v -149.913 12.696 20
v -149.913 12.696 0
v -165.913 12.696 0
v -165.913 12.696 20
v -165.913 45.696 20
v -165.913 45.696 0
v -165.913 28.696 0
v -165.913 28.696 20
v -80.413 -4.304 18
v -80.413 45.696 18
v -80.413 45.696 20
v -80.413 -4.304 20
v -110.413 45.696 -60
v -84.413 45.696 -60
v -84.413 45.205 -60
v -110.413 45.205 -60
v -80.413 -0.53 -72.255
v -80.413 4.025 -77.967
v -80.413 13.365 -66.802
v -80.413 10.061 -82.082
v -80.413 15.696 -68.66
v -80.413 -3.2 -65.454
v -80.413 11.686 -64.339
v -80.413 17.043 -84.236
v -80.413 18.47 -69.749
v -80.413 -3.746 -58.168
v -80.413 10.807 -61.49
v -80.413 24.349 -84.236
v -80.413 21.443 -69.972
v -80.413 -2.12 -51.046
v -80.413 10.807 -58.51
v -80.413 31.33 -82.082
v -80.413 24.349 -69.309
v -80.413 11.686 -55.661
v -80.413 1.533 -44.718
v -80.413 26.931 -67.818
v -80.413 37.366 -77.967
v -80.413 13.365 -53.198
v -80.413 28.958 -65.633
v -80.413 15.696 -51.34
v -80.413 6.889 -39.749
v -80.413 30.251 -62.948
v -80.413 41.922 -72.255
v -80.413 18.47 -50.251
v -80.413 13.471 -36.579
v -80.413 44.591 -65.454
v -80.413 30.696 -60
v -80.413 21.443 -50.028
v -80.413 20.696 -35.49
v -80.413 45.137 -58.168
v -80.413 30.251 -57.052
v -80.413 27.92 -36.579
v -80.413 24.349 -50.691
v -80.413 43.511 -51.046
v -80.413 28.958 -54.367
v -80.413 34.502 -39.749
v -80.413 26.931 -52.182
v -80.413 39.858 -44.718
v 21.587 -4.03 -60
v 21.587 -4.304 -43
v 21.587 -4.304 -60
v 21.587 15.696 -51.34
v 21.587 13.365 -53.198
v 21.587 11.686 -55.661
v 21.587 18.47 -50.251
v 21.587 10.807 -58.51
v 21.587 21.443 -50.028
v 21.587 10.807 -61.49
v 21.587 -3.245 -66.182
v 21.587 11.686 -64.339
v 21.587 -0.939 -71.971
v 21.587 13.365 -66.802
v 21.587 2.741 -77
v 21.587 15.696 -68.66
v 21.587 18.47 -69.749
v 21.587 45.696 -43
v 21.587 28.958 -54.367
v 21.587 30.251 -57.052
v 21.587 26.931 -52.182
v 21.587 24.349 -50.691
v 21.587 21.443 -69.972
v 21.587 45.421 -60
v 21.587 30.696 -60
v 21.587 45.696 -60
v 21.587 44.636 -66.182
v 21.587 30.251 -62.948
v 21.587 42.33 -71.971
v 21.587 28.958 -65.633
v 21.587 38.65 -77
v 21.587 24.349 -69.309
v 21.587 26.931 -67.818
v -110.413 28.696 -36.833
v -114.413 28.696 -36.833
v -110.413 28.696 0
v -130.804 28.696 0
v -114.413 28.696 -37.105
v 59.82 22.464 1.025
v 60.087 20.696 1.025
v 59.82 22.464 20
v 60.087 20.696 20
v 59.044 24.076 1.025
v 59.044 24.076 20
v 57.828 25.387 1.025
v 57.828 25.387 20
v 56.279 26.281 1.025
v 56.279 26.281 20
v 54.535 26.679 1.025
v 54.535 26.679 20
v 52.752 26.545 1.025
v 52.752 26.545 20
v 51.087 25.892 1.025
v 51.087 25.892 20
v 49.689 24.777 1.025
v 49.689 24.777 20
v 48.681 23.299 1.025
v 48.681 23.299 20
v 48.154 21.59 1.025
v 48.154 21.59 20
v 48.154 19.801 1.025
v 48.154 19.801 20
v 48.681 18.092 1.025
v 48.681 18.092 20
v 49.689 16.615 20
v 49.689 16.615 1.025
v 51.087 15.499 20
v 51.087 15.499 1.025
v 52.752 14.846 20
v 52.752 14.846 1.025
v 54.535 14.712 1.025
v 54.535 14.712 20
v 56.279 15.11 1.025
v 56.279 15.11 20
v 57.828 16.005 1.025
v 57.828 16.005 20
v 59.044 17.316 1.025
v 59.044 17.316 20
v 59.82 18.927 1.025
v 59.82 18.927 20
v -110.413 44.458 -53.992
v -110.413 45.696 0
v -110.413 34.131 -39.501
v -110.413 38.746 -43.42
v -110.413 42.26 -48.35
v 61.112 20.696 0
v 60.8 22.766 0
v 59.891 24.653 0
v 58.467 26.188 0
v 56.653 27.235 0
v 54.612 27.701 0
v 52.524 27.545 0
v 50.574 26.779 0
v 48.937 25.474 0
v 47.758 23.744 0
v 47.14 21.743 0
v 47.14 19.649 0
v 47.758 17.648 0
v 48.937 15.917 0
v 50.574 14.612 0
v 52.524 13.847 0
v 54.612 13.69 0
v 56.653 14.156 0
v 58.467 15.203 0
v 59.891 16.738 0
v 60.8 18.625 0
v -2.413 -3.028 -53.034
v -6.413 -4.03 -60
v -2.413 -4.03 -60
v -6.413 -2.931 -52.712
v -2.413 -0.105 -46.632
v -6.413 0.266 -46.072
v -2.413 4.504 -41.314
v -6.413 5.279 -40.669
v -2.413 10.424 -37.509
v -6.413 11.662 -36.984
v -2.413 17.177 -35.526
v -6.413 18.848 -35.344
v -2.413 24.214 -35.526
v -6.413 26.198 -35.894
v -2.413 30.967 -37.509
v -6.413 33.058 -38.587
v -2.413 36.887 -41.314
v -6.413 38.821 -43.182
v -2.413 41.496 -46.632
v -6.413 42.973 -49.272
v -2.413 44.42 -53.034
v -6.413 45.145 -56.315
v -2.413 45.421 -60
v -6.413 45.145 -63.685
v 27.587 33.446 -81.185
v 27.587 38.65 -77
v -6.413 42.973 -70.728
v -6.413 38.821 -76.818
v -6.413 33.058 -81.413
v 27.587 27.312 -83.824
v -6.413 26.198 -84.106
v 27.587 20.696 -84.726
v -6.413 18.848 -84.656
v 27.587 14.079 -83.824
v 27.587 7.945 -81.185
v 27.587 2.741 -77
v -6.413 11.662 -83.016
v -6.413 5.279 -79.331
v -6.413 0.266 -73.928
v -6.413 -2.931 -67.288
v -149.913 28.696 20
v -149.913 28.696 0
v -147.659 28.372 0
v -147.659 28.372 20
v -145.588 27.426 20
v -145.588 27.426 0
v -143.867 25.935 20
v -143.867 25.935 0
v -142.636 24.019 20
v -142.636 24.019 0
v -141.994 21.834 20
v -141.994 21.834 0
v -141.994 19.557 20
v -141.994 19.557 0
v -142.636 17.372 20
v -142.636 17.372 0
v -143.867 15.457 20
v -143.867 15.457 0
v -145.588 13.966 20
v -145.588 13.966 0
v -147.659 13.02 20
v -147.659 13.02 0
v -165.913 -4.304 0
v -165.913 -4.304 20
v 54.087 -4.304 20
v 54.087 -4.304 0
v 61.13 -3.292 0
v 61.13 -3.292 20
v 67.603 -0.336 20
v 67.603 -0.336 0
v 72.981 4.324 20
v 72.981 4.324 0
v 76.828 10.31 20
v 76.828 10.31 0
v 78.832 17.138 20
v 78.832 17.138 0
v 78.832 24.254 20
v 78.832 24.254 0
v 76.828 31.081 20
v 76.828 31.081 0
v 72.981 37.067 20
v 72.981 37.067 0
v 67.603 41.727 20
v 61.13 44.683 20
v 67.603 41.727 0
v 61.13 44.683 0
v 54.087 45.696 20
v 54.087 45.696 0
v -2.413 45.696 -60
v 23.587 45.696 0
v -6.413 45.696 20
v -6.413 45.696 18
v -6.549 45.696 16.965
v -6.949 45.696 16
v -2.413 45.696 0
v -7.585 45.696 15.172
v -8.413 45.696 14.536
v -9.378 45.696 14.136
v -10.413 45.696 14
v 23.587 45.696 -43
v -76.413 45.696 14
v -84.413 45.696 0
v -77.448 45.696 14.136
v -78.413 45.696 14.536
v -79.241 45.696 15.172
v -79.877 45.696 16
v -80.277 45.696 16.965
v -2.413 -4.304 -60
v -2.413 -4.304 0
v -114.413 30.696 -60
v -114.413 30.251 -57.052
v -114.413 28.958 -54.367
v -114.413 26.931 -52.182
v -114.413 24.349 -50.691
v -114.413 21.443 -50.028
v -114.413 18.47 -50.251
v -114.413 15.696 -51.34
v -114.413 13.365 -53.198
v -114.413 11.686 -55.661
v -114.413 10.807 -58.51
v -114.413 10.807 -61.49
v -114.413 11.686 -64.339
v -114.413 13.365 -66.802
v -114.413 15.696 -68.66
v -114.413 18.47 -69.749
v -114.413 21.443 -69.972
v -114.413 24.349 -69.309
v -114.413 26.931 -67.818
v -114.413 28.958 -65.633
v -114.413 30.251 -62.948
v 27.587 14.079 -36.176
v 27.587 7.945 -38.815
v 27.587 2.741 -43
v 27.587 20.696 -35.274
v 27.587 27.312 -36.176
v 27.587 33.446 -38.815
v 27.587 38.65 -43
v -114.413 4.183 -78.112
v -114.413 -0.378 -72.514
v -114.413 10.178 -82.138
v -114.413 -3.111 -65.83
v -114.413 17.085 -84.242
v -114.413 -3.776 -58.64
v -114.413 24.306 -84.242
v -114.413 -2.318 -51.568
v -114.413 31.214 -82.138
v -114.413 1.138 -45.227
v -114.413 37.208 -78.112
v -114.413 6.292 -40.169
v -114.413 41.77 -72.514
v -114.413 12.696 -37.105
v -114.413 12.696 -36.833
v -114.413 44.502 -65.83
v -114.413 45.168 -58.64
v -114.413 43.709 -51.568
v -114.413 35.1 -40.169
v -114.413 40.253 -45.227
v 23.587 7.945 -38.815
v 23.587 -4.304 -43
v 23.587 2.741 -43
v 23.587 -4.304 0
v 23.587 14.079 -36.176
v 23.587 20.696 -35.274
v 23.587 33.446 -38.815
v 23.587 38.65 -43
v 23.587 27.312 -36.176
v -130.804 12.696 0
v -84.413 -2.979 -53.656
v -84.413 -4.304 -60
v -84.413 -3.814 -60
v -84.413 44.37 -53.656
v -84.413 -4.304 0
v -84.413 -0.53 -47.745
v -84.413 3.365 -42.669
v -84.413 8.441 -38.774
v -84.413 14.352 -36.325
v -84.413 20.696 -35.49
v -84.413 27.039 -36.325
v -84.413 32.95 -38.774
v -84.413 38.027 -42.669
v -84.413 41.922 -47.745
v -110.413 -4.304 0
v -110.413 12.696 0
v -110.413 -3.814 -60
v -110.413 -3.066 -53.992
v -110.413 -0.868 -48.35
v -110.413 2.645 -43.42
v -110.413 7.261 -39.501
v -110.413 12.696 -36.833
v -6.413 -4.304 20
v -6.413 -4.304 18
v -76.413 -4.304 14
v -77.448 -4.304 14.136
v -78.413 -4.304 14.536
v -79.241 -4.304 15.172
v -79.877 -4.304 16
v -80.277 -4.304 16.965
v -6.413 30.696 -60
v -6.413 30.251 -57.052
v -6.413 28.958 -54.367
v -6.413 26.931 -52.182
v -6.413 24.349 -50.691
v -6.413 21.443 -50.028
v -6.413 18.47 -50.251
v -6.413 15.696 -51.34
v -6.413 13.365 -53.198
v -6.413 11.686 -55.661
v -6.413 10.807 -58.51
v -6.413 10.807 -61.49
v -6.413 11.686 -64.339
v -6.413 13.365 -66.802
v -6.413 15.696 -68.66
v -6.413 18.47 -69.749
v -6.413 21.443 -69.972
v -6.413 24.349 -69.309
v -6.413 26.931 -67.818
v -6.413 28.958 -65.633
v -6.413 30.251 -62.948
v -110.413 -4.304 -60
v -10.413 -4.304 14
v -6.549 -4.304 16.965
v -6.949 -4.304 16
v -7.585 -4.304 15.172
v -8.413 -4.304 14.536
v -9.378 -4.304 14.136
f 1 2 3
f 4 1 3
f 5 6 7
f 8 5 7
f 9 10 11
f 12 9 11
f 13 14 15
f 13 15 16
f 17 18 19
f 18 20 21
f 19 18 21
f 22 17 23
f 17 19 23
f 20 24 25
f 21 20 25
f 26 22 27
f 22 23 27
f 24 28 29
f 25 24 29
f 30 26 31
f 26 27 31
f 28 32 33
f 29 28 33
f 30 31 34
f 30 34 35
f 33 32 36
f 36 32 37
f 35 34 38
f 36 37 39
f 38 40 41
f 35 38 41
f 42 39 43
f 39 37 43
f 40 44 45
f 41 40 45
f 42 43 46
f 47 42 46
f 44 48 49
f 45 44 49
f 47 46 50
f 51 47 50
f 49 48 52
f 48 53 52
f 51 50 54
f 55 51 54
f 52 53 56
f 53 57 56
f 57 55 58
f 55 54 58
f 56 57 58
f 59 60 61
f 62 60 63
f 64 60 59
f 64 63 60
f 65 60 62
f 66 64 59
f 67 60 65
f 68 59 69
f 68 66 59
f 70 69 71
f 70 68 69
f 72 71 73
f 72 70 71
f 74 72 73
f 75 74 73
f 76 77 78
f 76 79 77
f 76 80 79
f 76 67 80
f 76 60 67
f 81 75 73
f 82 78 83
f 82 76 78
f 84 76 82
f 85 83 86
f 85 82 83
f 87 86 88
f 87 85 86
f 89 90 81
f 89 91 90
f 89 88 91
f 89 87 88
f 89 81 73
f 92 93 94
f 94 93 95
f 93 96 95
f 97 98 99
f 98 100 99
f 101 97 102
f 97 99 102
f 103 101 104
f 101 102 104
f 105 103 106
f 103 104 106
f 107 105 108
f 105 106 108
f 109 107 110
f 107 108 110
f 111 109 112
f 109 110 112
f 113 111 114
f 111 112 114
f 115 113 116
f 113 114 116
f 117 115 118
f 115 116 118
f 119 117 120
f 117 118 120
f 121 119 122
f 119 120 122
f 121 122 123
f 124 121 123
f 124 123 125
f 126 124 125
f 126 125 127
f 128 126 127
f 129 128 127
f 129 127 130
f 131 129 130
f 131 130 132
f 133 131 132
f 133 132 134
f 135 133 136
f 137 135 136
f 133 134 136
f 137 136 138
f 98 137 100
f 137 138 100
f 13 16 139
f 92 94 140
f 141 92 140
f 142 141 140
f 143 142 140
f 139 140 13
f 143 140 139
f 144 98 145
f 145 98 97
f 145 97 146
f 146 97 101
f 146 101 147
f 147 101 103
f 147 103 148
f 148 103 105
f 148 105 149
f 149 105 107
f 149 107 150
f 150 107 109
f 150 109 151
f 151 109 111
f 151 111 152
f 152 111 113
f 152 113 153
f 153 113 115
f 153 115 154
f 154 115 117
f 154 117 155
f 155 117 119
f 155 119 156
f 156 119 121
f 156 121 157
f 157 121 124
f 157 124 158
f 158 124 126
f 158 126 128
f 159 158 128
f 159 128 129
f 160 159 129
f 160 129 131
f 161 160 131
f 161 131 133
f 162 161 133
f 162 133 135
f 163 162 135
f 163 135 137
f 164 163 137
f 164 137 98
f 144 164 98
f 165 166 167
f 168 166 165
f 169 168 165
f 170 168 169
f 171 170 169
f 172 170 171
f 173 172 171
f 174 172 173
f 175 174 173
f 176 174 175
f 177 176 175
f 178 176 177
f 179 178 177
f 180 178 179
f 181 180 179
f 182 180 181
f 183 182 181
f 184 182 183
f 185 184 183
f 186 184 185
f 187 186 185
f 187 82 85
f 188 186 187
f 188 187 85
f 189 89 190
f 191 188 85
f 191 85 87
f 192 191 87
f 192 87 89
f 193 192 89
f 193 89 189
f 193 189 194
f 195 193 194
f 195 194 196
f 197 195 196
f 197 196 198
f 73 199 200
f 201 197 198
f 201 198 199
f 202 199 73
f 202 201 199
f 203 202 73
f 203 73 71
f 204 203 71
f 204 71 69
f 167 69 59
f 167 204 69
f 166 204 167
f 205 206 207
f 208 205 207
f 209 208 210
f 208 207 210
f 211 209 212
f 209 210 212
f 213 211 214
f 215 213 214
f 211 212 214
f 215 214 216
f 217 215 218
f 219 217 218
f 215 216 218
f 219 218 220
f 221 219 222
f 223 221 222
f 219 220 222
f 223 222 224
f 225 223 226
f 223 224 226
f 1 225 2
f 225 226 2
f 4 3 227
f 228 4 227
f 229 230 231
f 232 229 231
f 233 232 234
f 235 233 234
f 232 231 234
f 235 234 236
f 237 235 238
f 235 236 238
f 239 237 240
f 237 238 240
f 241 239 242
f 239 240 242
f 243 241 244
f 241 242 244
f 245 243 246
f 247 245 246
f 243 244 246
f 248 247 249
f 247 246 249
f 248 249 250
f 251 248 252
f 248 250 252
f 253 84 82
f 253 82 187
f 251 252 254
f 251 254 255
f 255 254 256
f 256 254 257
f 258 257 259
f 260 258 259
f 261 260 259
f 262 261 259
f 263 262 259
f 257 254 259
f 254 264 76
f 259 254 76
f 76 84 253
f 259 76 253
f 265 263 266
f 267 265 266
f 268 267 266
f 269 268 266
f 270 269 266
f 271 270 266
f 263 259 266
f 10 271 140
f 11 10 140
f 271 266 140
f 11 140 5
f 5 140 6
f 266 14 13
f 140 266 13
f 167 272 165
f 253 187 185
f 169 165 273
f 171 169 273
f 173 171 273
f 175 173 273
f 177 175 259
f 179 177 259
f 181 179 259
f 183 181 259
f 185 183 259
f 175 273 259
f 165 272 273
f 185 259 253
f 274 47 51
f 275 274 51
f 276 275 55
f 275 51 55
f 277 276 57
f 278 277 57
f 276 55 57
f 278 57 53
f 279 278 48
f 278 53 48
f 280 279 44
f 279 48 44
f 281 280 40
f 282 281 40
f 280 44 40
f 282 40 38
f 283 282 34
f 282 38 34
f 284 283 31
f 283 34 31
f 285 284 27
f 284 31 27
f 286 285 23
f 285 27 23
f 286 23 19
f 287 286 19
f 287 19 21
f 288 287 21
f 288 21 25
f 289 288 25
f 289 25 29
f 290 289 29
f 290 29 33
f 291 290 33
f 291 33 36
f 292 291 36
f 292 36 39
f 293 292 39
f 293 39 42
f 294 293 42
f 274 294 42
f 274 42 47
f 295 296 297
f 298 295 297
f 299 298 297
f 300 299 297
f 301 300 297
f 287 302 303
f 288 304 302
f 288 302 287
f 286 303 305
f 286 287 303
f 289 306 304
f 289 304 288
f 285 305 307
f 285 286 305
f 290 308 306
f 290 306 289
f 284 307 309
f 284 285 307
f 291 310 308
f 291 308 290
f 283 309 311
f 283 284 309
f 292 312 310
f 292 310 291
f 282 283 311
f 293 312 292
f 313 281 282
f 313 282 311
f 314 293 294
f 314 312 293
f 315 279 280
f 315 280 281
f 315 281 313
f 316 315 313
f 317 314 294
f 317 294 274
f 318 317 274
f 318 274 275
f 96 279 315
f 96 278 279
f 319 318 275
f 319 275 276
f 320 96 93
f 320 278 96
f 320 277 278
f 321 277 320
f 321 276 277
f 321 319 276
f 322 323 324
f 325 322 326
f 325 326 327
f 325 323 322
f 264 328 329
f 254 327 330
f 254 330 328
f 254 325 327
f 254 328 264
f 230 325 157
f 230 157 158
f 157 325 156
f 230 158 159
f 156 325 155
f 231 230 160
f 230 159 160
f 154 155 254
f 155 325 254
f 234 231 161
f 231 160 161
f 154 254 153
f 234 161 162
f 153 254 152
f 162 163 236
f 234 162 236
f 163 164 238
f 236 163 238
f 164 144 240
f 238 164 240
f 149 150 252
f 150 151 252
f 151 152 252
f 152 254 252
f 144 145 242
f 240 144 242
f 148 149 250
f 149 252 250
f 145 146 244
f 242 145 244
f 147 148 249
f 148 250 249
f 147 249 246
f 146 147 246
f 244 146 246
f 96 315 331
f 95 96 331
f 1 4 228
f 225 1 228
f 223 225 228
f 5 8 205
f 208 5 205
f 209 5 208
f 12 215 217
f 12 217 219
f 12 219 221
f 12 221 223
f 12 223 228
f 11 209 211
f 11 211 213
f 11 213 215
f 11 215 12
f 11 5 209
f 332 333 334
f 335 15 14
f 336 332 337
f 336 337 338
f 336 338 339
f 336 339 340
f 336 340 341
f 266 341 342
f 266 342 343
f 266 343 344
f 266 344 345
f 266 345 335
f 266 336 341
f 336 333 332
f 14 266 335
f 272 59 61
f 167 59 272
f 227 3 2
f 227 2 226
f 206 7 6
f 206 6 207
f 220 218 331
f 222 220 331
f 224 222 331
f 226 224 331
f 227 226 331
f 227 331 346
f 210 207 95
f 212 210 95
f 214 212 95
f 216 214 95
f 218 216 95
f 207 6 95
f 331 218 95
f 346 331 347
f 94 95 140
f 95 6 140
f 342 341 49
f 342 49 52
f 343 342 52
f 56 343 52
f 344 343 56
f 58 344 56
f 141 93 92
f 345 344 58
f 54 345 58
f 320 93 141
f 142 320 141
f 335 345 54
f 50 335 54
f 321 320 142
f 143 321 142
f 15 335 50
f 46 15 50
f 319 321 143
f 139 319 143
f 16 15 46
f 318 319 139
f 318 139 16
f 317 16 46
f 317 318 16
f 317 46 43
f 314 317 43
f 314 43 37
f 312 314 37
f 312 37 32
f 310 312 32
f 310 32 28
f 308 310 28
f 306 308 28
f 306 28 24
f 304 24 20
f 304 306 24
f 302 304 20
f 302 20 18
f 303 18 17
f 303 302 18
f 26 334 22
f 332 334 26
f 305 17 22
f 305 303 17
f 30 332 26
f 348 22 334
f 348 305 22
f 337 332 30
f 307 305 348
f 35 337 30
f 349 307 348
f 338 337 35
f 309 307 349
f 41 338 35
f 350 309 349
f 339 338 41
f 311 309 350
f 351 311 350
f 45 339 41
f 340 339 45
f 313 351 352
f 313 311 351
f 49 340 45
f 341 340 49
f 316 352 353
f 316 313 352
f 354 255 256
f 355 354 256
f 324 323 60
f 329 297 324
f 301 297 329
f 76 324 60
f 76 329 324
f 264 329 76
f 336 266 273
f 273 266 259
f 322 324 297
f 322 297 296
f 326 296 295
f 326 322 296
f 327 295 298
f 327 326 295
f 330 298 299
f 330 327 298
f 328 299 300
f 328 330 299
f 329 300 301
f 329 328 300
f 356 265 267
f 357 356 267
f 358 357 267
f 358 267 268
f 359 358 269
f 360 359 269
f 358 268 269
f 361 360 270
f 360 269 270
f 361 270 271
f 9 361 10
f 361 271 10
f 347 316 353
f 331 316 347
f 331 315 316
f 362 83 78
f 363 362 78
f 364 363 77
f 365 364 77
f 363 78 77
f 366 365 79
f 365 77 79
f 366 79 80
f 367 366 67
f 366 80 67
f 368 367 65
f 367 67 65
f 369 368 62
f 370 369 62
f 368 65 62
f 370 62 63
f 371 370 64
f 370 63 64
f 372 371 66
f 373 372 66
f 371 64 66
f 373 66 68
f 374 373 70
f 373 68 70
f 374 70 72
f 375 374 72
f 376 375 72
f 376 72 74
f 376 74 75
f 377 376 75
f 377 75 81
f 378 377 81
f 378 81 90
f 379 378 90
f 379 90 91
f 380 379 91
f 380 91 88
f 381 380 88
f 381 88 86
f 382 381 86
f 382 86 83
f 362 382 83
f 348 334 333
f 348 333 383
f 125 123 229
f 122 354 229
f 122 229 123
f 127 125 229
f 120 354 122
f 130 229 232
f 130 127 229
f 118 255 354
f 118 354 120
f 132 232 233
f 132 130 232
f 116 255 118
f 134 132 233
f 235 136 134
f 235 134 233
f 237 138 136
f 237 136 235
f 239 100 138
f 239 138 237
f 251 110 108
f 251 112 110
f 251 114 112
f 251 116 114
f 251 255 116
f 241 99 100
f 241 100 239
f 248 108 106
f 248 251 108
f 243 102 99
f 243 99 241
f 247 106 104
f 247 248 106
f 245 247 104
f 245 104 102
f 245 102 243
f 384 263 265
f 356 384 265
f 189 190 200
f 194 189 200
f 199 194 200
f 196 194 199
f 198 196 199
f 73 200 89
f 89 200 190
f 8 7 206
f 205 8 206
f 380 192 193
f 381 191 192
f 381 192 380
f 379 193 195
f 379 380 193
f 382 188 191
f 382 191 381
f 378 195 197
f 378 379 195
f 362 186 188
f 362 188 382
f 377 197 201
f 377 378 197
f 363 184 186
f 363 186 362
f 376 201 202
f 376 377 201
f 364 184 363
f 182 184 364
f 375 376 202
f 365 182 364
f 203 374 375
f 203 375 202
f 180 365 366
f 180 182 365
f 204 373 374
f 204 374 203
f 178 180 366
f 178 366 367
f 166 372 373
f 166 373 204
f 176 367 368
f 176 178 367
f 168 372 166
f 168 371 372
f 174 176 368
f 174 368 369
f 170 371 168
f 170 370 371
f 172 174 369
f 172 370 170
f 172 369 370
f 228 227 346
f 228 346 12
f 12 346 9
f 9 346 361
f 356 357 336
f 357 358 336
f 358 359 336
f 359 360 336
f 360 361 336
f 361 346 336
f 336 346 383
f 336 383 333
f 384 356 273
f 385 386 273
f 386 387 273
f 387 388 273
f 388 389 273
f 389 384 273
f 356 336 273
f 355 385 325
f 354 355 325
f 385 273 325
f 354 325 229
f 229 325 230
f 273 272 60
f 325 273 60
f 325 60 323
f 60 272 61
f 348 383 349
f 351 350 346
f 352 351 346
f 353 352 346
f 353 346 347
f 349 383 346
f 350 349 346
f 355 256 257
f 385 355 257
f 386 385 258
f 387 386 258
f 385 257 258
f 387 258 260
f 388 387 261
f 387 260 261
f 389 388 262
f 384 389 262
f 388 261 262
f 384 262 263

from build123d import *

# Parameters (mm, degrees)
BOSS_EXTRUDE1_DEPTH              = 20
CUT_EXTRUDE1_DEPTH               = 80
M14X2_0_TAPPED_HOLE2_D           = 12
M14X2_0_TAPPED_HOLE2_CSINK_D     = 14.05
M14X2_0_TAPPED_HOLE2_CSINK_ANGLE = 90
SKETCH11_W                       = 26
SKETCH11_H                       = 50
BOSS_EXTRUDE2_DEPTH              = 60
BOSS_EXTRUDE3_START              = 4
SKETCH12_R                       = 24.50968872
BOSS_EXTRUDE3_DEPTH              = 34
BOSS_EXTRUDE4_START              = 4
SKETCH13_R                       = 24.725624797
BOSS_EXTRUDE4_DEPTH              = 34
SKETCH14_R                       = 10
CUT_EXTRUDE2_DEPTH               = 234
SKETCH15_W                       = 34
SKETCH15_H                       = 100.230824912
CUT_EXTRUDE3_DEPTH               = 6
RIB6_REACH                       = 189.964
SKETCH16_WALL_W                  = 418.569099694
SKETCH16_WALL_H                  = 16


with BuildPart() as part:
    # Sketch1 → Boss-Extrude1 (new body)
    with BuildSketch(Plane.XY):
        with BuildLine():
            Line((-165.913043478, -4.304347826), (54.086956522, -4.304347826))
            ThreePointArc((54.086956522, -4.304347826), (79.086956522, 20.695652174), (54.086956522, 45.695652174))
            Line((54.086956522, 45.695652174), (-165.913043478, 45.695652174))
            Line((-165.913043478, 45.695652174), (-165.913043478, 28.695652174))
            Line((-165.913043478, 28.695652174), (-149.913043478, 28.695652174))
            ThreePointArc((-149.913043478, 28.695652174), (-141.913043478, 20.695652174), (-149.913043478, 12.695652174))
            Line((-149.913043478, 12.695652174), (-165.913043478, 12.695652174))
            Line((-165.913043478, 12.695652174), (-165.913043478, -4.304347826))
        make_face()
    extrude(amount=BOSS_EXTRUDE1_DEPTH)

    # Sketch2 → Cut-Extrude1 (cut)
    with BuildSketch(Plane(origin=(0, 45.695652174, 0), x_dir=(1, 0, 0), z_dir=(0, 1, 0))):
        with BuildLine():
            Line((-80.413043478, -20), (-6.413043478, -20))
            Line((-6.413043478, -20), (-6.413043478, -18))
            ThreePointArc((-6.413043478, -18), (-7.584616354, -15.171572875), (-10.413043478, -14))
            Line((-10.413043478, -14), (-76.413043478, -14))
            ThreePointArc((-76.413043478, -14), (-79.241470603, -15.171572875), (-80.413043478, -18))
            Line((-80.413043478, -18), (-80.413043478, -20))
        make_face()
    extrude(amount=-CUT_EXTRUDE1_DEPTH, mode=Mode.SUBTRACT)

    # M14x2.0 Tapped Hole2 (through all)
    with Locations(Plane(origin=(0, 0, 0), x_dir=(-1, 0, 0), z_dir=(0, 0, -1))):
        with Locations((-54.086956522, 20.695652174)):
            CounterSinkHole(M14X2_0_TAPPED_HOLE2_D / 2, M14X2_0_TAPPED_HOLE2_CSINK_D / 2, counter_sink_angle=M14X2_0_TAPPED_HOLE2_CSINK_ANGLE)

    # Sketch11 → Boss-Extrude2 (add)
    with BuildSketch(Plane(origin=(0, 0, 0), x_dir=(-1, 0, 0), z_dir=(0, 0, -1))):
        with Locations((97.413043478, 20.695652174)):
            Rectangle(SKETCH11_W, SKETCH11_H)
        with Locations((-10.586956522, 20.695652174)):
            Rectangle(SKETCH11_W, SKETCH11_H)
    extrude(amount=BOSS_EXTRUDE2_DEPTH)

    # Sketch12 → Boss-Extrude3 (add)
    with BuildSketch(Plane.ZY.offset(110.413043478).offset(BOSS_EXTRUDE3_START)):
        with Locations((-60, 20.695652174)):
            Circle(SKETCH12_R)
    extrude(amount=-BOSS_EXTRUDE3_DEPTH)

    # Sketch13 → Boss-Extrude4 (add)
    with BuildSketch(Plane.ZY.offset(2.413043478).offset(BOSS_EXTRUDE4_START)):
        with Locations(Location((-60, 20.695652174, 0), (0, 0, 270))):
            Circle(SKETCH13_R)
    extrude(amount=-BOSS_EXTRUDE4_DEPTH)

    # Sketch14 → Cut-Extrude2 (cut)
    with BuildSketch(Plane(origin=(27.586956522, 0, 0), x_dir=(0, 0, -1), z_dir=(1, 0, 0))):
        with Locations(Location((60, 20.695652174, 0), (0, 0, 90))):
            Circle(SKETCH14_R)
    extrude(amount=-CUT_EXTRUDE2_DEPTH, mode=Mode.SUBTRACT)

    # Sketch15 → Cut-Extrude3 (cut)
    with BuildSketch(Plane(origin=(27.586956522, 0, 0), x_dir=(0, 0, -1), z_dir=(1, 0, 0))):
        with Locations((60, 20.695652174)):
            Rectangle(SKETCH15_W, SKETCH15_H)
    extrude(amount=-CUT_EXTRUDE3_DEPTH, mode=Mode.SUBTRACT)

    # Sketch16 wall → Rib6 (add, up to next)
    with BuildSketch(Plane(origin=(-122.592806802, 20.695652174, -18.5875655), x_dir=(-0.404065346257, 0, 0.914730121924), z_dir=(0.914730121924, 0, 0.404065346257)), mode=Mode.PRIVATE) as rib6_sk1:
        Rectangle(SKETCH16_WALL_W, SKETCH16_WALL_H)
    rib6_tool1 = extrude(rib6_sk1.sketch, amount=RIB6_REACH, mode=Mode.PRIVATE) - part.part
    add(rib6_tool1.solids().sort_by_distance((-122.592806802, 20.695652174, -18.5875655))[0])


solid = part.part
